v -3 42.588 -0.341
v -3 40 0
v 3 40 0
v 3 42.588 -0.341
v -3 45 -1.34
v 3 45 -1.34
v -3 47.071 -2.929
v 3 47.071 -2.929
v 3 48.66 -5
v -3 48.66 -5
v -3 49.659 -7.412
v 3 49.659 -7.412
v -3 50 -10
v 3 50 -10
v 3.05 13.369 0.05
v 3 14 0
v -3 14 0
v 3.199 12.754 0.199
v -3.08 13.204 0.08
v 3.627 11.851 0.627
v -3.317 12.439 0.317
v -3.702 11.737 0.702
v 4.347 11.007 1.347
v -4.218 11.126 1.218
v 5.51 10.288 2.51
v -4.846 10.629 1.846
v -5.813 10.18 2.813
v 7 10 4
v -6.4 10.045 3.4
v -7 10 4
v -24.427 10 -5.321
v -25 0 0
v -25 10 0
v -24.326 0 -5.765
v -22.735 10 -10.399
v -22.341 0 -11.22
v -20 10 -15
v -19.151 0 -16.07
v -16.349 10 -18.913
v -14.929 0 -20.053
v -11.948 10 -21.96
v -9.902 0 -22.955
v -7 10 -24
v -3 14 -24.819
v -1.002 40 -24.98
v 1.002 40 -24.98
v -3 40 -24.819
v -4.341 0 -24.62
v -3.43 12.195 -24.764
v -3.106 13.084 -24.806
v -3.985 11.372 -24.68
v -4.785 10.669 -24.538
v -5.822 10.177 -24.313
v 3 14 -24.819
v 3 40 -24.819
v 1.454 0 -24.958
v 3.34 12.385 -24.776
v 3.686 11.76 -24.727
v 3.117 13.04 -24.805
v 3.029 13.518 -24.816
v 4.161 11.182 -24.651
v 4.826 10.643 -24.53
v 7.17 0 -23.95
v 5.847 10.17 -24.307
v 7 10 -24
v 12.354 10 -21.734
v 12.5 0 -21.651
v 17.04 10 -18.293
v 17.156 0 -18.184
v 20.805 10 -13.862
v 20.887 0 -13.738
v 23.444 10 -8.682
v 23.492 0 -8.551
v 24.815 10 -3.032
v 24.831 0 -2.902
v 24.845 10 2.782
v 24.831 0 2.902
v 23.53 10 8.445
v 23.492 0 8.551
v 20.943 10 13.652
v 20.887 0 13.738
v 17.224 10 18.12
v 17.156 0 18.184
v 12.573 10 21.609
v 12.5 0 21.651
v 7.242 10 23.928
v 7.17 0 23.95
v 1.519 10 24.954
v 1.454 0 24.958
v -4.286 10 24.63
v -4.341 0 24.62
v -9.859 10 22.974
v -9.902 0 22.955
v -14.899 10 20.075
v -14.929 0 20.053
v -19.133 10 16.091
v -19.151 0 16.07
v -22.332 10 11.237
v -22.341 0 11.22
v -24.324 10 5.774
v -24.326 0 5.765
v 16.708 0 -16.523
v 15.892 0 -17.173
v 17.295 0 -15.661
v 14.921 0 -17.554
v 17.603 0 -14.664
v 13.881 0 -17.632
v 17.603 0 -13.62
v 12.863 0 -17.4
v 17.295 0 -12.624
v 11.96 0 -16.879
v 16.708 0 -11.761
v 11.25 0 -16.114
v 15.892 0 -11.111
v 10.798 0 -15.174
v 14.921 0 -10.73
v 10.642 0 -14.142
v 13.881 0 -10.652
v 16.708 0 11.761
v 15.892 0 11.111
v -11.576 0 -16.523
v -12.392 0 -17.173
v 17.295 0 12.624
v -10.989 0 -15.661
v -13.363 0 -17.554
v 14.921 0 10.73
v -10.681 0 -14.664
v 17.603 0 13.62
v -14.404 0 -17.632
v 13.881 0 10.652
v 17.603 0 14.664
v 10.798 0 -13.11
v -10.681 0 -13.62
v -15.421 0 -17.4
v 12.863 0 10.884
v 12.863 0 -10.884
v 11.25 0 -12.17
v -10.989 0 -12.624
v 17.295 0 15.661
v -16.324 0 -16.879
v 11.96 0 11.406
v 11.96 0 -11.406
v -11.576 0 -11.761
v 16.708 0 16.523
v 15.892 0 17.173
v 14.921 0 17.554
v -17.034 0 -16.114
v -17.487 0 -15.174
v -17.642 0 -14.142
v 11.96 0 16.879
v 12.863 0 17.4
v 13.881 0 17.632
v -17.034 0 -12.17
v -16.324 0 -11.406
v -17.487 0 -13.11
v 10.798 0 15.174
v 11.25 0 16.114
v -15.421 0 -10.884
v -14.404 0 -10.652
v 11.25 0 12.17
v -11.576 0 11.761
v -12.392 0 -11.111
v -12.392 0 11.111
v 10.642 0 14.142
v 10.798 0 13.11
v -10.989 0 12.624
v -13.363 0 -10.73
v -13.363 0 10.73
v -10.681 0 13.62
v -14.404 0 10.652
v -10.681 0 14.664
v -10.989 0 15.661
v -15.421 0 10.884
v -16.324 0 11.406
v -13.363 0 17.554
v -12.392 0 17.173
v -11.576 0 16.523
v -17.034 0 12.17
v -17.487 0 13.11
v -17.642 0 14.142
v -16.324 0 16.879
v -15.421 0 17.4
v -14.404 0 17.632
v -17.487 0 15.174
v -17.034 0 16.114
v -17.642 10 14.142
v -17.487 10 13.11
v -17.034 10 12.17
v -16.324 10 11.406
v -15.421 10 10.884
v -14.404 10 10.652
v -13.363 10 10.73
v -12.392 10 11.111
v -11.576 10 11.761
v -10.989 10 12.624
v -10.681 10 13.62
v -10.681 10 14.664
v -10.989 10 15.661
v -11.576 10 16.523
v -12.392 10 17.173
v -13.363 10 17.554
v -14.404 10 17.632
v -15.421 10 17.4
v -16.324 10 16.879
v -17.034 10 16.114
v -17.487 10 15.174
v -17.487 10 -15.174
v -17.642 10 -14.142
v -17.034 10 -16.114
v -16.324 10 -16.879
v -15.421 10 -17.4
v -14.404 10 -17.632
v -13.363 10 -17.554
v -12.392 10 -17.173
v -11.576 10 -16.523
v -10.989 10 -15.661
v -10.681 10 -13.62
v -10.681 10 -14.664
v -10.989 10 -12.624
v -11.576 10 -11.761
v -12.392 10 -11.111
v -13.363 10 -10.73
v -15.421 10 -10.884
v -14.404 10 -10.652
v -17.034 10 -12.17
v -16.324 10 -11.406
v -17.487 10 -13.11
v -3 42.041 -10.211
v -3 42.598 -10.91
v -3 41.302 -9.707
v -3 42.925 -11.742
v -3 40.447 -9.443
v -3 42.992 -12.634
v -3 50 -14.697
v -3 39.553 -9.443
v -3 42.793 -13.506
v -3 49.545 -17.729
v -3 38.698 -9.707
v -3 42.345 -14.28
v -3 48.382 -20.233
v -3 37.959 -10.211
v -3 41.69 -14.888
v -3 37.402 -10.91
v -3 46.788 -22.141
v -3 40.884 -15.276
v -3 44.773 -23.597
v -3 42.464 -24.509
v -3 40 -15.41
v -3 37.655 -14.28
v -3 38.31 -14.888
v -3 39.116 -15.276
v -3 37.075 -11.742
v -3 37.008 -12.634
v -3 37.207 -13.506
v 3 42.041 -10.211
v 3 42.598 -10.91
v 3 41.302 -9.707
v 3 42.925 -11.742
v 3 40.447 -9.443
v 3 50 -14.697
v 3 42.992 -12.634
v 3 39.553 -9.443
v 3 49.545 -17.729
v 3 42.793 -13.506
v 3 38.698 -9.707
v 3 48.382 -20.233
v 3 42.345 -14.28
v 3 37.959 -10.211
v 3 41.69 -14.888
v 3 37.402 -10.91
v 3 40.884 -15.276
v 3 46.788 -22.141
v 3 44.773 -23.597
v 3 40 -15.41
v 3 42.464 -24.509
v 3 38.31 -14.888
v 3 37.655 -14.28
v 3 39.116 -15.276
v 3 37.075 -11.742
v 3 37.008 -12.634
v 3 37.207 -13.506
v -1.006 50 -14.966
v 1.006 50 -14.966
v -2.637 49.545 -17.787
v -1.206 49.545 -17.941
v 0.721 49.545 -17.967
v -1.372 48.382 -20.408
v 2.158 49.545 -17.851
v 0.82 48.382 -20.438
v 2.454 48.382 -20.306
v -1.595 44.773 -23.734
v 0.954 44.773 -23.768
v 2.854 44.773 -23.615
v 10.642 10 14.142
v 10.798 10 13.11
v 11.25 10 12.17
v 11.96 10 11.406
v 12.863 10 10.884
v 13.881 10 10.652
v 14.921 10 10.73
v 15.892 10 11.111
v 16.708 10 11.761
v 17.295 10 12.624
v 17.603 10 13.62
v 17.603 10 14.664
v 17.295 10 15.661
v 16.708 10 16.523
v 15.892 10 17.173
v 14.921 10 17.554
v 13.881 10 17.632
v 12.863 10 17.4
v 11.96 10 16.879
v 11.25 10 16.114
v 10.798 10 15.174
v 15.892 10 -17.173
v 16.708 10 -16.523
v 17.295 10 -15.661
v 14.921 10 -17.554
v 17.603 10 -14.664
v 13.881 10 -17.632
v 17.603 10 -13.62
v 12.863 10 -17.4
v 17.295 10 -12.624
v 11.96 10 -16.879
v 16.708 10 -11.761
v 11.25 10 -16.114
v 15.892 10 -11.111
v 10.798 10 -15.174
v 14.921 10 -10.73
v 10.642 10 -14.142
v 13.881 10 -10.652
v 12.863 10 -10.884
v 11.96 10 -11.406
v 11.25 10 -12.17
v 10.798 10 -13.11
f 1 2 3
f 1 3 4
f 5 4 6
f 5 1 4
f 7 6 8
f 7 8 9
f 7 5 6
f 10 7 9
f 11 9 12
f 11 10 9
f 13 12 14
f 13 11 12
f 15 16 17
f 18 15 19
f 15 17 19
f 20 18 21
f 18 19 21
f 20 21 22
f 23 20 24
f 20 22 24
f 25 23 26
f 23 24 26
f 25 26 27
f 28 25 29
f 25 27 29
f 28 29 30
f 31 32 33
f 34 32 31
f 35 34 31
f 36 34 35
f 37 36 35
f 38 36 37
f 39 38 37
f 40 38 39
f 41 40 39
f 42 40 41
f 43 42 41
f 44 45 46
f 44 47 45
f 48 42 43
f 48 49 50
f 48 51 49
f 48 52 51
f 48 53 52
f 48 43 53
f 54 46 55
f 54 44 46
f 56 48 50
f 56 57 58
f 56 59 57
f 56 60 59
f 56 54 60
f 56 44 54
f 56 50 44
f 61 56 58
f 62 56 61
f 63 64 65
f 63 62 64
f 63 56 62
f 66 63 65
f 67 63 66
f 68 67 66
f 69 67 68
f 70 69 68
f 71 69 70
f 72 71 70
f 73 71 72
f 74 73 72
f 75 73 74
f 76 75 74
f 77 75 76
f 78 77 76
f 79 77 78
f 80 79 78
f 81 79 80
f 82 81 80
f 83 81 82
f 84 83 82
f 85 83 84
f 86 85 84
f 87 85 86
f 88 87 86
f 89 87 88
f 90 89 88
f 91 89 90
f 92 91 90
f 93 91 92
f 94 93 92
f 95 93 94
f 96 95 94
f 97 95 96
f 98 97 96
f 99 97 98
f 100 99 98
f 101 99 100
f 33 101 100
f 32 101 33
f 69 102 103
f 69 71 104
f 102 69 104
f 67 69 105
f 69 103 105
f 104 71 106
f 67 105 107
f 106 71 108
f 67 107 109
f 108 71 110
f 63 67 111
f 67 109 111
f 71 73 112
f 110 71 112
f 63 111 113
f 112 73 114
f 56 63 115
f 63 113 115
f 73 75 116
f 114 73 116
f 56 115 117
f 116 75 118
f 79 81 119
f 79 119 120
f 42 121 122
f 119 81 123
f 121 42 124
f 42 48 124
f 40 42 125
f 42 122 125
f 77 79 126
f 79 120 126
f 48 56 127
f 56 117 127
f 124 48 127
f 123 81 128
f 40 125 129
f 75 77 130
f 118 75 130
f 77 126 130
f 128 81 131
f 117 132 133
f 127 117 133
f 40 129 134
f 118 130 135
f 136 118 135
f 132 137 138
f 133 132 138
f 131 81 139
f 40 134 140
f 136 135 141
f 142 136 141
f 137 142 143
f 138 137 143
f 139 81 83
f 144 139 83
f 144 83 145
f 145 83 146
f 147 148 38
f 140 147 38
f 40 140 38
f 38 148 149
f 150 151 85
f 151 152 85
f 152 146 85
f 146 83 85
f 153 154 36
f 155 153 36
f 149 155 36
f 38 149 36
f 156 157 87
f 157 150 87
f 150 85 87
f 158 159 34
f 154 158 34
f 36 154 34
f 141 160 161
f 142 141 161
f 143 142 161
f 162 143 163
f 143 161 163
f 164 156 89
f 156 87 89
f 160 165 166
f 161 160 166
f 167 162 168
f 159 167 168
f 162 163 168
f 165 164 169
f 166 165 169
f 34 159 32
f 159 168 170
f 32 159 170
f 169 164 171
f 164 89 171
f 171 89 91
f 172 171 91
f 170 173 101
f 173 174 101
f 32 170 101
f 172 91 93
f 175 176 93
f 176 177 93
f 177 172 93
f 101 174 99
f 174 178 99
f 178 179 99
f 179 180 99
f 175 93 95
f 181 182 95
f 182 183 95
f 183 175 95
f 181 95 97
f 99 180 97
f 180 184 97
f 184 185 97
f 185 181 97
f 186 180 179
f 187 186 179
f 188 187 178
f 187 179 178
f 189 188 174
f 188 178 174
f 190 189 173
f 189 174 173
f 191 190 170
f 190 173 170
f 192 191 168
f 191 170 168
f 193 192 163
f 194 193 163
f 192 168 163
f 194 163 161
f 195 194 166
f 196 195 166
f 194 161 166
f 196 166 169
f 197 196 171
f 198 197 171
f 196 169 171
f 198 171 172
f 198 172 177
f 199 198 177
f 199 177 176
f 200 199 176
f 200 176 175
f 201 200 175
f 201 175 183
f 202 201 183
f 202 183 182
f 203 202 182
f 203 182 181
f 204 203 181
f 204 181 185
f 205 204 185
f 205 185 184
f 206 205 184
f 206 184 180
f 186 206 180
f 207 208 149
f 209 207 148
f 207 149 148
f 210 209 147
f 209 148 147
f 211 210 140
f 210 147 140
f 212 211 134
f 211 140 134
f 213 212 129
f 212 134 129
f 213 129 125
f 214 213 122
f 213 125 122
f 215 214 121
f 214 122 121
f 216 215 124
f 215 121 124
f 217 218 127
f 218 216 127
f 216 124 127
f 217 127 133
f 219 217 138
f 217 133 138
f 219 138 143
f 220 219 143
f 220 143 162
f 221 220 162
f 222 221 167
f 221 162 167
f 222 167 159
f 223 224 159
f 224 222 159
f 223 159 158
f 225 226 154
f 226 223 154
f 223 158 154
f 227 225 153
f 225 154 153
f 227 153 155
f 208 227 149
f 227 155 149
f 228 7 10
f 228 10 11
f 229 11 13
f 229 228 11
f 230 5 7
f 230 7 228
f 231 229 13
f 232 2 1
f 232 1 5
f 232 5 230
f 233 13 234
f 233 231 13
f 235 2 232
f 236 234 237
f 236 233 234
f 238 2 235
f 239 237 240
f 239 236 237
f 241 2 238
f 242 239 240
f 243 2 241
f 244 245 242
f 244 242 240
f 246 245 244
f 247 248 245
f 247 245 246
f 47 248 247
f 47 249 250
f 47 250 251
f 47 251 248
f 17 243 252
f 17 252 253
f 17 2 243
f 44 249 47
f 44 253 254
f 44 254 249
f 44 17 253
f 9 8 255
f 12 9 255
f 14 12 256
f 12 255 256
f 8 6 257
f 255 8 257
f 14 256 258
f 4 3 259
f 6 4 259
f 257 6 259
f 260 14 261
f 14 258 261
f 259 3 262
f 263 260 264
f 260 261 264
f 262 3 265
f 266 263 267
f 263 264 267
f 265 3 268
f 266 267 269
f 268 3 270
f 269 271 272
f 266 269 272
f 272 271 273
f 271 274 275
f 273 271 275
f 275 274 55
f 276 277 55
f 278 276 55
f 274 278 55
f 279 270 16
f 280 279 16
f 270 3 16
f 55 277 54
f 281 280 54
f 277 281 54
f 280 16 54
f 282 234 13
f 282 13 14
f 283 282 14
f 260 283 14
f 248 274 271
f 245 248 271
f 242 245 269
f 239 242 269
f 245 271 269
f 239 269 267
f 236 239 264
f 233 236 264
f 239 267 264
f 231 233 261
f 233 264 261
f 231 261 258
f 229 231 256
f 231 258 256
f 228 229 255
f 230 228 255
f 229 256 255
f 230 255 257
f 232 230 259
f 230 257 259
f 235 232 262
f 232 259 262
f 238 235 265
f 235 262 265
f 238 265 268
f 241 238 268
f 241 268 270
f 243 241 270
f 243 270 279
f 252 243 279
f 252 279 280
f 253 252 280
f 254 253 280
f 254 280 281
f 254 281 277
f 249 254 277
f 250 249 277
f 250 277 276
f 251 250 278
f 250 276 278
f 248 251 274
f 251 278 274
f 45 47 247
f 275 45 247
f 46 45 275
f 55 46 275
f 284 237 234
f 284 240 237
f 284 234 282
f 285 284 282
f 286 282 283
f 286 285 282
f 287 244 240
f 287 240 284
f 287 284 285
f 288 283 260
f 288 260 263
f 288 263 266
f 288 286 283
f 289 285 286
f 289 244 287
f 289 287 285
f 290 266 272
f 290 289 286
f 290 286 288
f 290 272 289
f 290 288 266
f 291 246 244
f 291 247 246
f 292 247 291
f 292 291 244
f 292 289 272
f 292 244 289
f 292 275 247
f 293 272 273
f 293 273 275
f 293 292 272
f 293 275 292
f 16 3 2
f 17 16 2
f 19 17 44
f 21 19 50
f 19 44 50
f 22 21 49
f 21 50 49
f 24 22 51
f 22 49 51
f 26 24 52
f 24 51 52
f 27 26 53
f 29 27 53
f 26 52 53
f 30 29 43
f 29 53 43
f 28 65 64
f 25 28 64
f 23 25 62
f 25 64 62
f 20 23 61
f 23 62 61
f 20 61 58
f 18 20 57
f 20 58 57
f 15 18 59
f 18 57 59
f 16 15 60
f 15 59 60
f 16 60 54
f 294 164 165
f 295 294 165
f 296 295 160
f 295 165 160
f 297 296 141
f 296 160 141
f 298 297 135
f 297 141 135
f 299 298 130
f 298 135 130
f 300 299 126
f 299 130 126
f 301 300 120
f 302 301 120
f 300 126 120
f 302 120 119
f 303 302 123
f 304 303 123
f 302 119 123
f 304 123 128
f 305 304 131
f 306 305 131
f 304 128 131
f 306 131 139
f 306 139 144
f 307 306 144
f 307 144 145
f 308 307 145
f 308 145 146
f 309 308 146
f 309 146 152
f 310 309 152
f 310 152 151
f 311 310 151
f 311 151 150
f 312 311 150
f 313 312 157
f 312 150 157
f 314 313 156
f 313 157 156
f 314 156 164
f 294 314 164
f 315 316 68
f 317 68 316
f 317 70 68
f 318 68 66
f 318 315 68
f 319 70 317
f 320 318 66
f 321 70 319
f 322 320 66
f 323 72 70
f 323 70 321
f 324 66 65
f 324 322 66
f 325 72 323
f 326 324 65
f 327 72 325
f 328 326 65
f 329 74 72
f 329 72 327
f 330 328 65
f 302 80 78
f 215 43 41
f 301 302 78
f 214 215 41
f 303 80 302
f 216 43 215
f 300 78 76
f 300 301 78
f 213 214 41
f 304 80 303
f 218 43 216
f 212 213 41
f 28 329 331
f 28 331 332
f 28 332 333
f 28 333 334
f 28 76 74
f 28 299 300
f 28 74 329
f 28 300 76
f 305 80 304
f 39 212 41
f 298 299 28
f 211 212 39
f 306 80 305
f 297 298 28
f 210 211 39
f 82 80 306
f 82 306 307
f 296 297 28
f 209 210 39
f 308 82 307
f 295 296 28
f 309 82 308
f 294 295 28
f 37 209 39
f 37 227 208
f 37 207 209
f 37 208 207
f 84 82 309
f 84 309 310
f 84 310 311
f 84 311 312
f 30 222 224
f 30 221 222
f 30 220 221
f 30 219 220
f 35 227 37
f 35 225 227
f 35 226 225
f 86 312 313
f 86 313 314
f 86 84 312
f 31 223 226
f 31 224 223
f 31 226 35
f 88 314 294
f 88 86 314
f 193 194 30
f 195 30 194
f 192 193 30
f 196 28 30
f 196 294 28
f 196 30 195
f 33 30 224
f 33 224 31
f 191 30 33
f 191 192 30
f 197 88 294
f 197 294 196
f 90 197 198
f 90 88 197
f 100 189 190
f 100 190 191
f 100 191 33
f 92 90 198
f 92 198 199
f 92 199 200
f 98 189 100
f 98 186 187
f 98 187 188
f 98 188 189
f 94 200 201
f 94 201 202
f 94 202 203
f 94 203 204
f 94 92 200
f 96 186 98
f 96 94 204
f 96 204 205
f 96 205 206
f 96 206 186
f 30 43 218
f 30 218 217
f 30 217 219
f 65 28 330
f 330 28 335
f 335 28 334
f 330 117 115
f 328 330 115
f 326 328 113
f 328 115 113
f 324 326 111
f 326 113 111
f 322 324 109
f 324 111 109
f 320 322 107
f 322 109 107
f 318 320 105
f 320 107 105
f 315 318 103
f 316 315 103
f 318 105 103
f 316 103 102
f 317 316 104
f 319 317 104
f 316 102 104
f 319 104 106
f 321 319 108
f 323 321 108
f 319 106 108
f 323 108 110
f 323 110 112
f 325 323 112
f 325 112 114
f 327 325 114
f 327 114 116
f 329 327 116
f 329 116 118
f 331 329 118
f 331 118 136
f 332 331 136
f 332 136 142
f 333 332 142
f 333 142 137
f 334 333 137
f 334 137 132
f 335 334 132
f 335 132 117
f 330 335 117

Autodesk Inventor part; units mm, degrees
ref_plane "YZ Plane" through (0, 0, 0) normal (1, 0, 0) x (0, 1, 0)
ref_plane "XZ Plane" through (0, 0, 0) normal (0, 1, 0) x (-1, 0, 0)
ref_plane "XY Plane" through (0, 0, 0) normal (0, 0, 1) x (1, 0, 0)
sketch "Boceto1" plane through (0, 0, 0) normal (0, 1, 0) x (-1, 0, 0)
  circle A0 centre (14.1421, -14.1421) radius 3.5
  circle A1 centre (-14.1421, -14.1421) radius 3.5
  circle A2 centre (-14.1421, 14.1421) radius 3.5
  circle A3 centre (14.1421, 14.1421) radius 3.5
  circle A4 centre (0, 0) radius 25
  circle A5 centre (0, 0) radius 20
  dimension "d24" = 40
  dimension "d23" = 7
  dimension "d25" = 50
  dimension "d26" = 7
  dimension "d27" = 7
  dimension "d28" = 7
extrude "Extrusión1" add sketch "Boceto1" along normal blind 10 contours A0 A5 A1 A2 A3 | A4
sketch "Boceto2" plane through (0, 10, 0) normal (0, 1, 0) x (1, 0, 0)
  line L0 (0, 0) -> (3, 0)
  line L1 (3, 0) -> (3, 24.8193)
  circle A0 centre (0, 0) radius 25 projected
  line L2 (0, 0) -> (-3, 0)
  line L3 (-3, 0) -> (-3, 24.8193)
  arc A1 (3, 24.8193) -> (-3, 24.8193) centre (0, 0) ccw
  dimension "d13" = 3
  dimension "d14" = 3
extrude "Extrusión2" add sketch "Boceto2" along normal blind 40 contours L2 L3 A0 L1 L0 picked at (-2, 8.2731)
fillet "Empalme1" radius 10 1 edges at (0, 50, 0)
fillet "Empalme2" radius 10 1 edges at (0, 50, -25)
fillet "Empalme3" radius 4 3 edges at (3, 10, -12.4097) (0, 10, 0) (-3, 10, -12.4097)
sketch "Boceto3" plane through (3, 50, -10) normal (1, 0, 0) x (0, 0, -1)
  line L0 (-10, -36) -> (-10, -10) projected
  line L1 (14.8193, -36) -> (14.8193, -10) projected
  circle A0 centre (2.4097, -10) radius 3
  point P0 (-10, -50)
extrude "Extrusión3" cut sketch "Boceto3" against normal blind 40
properties part number "Base"
